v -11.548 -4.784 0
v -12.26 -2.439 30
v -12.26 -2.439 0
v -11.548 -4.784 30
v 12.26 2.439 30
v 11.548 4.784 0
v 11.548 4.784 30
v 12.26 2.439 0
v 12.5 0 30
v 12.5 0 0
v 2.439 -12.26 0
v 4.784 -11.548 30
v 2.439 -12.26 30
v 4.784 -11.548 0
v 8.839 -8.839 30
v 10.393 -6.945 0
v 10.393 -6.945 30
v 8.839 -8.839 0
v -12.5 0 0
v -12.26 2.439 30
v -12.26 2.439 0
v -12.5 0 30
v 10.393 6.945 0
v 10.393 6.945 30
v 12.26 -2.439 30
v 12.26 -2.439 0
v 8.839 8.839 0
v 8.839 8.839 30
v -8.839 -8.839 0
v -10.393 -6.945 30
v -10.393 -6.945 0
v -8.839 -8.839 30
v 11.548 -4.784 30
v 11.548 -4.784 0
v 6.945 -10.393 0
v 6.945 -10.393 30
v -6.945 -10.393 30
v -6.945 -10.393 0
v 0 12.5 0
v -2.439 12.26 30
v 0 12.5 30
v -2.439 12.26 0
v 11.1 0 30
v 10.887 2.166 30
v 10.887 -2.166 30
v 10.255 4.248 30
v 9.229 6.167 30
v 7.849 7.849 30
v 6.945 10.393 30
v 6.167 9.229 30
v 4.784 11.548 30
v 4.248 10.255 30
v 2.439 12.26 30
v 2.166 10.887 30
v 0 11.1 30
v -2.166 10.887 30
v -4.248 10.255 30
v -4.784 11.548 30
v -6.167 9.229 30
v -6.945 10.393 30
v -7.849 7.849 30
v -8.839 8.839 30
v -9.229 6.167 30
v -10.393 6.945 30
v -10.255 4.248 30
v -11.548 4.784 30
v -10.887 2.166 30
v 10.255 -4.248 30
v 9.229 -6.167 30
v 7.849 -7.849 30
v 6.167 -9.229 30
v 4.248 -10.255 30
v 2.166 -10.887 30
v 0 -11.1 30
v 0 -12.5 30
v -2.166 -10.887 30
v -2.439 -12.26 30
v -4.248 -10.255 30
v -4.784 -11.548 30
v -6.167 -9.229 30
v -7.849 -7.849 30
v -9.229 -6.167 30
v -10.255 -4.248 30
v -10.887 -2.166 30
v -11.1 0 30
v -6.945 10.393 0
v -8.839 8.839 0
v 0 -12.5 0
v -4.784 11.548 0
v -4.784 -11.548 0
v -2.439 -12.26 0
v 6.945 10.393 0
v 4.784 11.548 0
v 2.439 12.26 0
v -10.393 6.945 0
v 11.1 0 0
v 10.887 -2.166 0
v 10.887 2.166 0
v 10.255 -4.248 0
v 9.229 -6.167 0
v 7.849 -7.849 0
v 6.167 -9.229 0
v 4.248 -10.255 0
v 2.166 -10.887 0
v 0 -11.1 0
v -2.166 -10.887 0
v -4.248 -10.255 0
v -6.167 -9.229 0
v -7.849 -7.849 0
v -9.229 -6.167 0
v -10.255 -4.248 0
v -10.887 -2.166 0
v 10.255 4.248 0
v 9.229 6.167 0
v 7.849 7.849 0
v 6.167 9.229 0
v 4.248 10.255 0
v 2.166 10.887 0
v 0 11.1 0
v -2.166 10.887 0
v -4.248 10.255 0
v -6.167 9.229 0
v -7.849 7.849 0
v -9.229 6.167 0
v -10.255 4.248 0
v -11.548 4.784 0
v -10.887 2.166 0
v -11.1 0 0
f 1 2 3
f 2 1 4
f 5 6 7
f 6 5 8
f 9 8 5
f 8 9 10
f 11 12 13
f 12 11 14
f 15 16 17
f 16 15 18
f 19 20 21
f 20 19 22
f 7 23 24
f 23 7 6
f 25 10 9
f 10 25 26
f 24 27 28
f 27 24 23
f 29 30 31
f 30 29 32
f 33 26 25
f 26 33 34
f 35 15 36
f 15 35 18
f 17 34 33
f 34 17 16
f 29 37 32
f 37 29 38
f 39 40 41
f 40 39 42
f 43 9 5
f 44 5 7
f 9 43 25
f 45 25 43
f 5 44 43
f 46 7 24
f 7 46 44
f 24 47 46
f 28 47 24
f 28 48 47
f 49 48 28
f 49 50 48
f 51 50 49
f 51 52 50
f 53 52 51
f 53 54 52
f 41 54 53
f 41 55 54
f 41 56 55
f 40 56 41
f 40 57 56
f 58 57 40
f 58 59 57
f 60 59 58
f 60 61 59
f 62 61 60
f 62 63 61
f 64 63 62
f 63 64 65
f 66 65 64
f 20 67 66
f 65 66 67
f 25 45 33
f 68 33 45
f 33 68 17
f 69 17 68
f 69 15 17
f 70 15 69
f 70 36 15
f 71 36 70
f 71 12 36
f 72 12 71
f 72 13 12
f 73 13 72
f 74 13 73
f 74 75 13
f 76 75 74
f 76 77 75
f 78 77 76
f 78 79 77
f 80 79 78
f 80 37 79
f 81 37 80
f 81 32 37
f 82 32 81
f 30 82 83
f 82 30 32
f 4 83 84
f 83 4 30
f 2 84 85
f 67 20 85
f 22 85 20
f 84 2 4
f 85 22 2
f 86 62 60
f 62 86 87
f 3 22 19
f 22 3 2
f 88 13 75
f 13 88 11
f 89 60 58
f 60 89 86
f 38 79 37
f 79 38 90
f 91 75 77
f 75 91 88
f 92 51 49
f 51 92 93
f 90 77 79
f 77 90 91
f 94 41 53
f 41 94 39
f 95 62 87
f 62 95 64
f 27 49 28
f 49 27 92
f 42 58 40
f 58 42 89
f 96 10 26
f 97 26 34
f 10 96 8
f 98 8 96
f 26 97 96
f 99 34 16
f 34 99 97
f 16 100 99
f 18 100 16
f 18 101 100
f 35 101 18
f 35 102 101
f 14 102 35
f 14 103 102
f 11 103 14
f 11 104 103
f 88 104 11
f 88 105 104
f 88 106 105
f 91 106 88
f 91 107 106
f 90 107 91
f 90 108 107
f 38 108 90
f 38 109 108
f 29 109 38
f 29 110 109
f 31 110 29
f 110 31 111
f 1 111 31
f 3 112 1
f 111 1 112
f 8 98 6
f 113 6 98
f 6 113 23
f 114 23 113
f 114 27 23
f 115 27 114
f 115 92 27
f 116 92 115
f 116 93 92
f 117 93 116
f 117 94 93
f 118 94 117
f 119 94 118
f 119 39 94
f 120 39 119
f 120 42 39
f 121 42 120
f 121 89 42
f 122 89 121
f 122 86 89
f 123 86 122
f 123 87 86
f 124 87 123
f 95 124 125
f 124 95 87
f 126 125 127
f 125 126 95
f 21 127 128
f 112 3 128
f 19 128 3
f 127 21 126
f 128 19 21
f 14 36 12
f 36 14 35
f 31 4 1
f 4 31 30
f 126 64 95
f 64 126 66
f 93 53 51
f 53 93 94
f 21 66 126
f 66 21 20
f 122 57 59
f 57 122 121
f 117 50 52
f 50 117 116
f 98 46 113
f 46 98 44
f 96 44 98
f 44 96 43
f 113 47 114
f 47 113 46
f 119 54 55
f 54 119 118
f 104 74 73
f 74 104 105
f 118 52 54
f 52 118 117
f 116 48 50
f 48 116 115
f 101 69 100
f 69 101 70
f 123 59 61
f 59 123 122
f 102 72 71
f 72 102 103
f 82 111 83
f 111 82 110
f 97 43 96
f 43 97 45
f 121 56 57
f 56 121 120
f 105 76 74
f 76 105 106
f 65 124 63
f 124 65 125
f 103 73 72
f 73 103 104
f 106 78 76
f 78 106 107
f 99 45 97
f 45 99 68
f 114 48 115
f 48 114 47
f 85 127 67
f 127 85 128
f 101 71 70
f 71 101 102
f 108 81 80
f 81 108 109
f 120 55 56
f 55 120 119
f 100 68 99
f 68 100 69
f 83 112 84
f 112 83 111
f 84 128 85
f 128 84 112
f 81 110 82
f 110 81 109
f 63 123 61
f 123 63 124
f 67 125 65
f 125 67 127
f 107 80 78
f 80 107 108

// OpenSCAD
$fn = 32;

// ----------------------------------------------------------------------
// Thin tube: 1.4 mm wall
// ----------------------------------------------------------------------

// --- parameters (mm) ---
tube_od = 25;             // outer diameter
tube_h = 30;              // height, Z
wall = 1.4;               // wall thickness

difference() {
  cylinder(h = tube_h, d = tube_od);
  translate([0, 0, -1]) cylinder(h = tube_h + 2, d = tube_od - 2 * wall);
}
